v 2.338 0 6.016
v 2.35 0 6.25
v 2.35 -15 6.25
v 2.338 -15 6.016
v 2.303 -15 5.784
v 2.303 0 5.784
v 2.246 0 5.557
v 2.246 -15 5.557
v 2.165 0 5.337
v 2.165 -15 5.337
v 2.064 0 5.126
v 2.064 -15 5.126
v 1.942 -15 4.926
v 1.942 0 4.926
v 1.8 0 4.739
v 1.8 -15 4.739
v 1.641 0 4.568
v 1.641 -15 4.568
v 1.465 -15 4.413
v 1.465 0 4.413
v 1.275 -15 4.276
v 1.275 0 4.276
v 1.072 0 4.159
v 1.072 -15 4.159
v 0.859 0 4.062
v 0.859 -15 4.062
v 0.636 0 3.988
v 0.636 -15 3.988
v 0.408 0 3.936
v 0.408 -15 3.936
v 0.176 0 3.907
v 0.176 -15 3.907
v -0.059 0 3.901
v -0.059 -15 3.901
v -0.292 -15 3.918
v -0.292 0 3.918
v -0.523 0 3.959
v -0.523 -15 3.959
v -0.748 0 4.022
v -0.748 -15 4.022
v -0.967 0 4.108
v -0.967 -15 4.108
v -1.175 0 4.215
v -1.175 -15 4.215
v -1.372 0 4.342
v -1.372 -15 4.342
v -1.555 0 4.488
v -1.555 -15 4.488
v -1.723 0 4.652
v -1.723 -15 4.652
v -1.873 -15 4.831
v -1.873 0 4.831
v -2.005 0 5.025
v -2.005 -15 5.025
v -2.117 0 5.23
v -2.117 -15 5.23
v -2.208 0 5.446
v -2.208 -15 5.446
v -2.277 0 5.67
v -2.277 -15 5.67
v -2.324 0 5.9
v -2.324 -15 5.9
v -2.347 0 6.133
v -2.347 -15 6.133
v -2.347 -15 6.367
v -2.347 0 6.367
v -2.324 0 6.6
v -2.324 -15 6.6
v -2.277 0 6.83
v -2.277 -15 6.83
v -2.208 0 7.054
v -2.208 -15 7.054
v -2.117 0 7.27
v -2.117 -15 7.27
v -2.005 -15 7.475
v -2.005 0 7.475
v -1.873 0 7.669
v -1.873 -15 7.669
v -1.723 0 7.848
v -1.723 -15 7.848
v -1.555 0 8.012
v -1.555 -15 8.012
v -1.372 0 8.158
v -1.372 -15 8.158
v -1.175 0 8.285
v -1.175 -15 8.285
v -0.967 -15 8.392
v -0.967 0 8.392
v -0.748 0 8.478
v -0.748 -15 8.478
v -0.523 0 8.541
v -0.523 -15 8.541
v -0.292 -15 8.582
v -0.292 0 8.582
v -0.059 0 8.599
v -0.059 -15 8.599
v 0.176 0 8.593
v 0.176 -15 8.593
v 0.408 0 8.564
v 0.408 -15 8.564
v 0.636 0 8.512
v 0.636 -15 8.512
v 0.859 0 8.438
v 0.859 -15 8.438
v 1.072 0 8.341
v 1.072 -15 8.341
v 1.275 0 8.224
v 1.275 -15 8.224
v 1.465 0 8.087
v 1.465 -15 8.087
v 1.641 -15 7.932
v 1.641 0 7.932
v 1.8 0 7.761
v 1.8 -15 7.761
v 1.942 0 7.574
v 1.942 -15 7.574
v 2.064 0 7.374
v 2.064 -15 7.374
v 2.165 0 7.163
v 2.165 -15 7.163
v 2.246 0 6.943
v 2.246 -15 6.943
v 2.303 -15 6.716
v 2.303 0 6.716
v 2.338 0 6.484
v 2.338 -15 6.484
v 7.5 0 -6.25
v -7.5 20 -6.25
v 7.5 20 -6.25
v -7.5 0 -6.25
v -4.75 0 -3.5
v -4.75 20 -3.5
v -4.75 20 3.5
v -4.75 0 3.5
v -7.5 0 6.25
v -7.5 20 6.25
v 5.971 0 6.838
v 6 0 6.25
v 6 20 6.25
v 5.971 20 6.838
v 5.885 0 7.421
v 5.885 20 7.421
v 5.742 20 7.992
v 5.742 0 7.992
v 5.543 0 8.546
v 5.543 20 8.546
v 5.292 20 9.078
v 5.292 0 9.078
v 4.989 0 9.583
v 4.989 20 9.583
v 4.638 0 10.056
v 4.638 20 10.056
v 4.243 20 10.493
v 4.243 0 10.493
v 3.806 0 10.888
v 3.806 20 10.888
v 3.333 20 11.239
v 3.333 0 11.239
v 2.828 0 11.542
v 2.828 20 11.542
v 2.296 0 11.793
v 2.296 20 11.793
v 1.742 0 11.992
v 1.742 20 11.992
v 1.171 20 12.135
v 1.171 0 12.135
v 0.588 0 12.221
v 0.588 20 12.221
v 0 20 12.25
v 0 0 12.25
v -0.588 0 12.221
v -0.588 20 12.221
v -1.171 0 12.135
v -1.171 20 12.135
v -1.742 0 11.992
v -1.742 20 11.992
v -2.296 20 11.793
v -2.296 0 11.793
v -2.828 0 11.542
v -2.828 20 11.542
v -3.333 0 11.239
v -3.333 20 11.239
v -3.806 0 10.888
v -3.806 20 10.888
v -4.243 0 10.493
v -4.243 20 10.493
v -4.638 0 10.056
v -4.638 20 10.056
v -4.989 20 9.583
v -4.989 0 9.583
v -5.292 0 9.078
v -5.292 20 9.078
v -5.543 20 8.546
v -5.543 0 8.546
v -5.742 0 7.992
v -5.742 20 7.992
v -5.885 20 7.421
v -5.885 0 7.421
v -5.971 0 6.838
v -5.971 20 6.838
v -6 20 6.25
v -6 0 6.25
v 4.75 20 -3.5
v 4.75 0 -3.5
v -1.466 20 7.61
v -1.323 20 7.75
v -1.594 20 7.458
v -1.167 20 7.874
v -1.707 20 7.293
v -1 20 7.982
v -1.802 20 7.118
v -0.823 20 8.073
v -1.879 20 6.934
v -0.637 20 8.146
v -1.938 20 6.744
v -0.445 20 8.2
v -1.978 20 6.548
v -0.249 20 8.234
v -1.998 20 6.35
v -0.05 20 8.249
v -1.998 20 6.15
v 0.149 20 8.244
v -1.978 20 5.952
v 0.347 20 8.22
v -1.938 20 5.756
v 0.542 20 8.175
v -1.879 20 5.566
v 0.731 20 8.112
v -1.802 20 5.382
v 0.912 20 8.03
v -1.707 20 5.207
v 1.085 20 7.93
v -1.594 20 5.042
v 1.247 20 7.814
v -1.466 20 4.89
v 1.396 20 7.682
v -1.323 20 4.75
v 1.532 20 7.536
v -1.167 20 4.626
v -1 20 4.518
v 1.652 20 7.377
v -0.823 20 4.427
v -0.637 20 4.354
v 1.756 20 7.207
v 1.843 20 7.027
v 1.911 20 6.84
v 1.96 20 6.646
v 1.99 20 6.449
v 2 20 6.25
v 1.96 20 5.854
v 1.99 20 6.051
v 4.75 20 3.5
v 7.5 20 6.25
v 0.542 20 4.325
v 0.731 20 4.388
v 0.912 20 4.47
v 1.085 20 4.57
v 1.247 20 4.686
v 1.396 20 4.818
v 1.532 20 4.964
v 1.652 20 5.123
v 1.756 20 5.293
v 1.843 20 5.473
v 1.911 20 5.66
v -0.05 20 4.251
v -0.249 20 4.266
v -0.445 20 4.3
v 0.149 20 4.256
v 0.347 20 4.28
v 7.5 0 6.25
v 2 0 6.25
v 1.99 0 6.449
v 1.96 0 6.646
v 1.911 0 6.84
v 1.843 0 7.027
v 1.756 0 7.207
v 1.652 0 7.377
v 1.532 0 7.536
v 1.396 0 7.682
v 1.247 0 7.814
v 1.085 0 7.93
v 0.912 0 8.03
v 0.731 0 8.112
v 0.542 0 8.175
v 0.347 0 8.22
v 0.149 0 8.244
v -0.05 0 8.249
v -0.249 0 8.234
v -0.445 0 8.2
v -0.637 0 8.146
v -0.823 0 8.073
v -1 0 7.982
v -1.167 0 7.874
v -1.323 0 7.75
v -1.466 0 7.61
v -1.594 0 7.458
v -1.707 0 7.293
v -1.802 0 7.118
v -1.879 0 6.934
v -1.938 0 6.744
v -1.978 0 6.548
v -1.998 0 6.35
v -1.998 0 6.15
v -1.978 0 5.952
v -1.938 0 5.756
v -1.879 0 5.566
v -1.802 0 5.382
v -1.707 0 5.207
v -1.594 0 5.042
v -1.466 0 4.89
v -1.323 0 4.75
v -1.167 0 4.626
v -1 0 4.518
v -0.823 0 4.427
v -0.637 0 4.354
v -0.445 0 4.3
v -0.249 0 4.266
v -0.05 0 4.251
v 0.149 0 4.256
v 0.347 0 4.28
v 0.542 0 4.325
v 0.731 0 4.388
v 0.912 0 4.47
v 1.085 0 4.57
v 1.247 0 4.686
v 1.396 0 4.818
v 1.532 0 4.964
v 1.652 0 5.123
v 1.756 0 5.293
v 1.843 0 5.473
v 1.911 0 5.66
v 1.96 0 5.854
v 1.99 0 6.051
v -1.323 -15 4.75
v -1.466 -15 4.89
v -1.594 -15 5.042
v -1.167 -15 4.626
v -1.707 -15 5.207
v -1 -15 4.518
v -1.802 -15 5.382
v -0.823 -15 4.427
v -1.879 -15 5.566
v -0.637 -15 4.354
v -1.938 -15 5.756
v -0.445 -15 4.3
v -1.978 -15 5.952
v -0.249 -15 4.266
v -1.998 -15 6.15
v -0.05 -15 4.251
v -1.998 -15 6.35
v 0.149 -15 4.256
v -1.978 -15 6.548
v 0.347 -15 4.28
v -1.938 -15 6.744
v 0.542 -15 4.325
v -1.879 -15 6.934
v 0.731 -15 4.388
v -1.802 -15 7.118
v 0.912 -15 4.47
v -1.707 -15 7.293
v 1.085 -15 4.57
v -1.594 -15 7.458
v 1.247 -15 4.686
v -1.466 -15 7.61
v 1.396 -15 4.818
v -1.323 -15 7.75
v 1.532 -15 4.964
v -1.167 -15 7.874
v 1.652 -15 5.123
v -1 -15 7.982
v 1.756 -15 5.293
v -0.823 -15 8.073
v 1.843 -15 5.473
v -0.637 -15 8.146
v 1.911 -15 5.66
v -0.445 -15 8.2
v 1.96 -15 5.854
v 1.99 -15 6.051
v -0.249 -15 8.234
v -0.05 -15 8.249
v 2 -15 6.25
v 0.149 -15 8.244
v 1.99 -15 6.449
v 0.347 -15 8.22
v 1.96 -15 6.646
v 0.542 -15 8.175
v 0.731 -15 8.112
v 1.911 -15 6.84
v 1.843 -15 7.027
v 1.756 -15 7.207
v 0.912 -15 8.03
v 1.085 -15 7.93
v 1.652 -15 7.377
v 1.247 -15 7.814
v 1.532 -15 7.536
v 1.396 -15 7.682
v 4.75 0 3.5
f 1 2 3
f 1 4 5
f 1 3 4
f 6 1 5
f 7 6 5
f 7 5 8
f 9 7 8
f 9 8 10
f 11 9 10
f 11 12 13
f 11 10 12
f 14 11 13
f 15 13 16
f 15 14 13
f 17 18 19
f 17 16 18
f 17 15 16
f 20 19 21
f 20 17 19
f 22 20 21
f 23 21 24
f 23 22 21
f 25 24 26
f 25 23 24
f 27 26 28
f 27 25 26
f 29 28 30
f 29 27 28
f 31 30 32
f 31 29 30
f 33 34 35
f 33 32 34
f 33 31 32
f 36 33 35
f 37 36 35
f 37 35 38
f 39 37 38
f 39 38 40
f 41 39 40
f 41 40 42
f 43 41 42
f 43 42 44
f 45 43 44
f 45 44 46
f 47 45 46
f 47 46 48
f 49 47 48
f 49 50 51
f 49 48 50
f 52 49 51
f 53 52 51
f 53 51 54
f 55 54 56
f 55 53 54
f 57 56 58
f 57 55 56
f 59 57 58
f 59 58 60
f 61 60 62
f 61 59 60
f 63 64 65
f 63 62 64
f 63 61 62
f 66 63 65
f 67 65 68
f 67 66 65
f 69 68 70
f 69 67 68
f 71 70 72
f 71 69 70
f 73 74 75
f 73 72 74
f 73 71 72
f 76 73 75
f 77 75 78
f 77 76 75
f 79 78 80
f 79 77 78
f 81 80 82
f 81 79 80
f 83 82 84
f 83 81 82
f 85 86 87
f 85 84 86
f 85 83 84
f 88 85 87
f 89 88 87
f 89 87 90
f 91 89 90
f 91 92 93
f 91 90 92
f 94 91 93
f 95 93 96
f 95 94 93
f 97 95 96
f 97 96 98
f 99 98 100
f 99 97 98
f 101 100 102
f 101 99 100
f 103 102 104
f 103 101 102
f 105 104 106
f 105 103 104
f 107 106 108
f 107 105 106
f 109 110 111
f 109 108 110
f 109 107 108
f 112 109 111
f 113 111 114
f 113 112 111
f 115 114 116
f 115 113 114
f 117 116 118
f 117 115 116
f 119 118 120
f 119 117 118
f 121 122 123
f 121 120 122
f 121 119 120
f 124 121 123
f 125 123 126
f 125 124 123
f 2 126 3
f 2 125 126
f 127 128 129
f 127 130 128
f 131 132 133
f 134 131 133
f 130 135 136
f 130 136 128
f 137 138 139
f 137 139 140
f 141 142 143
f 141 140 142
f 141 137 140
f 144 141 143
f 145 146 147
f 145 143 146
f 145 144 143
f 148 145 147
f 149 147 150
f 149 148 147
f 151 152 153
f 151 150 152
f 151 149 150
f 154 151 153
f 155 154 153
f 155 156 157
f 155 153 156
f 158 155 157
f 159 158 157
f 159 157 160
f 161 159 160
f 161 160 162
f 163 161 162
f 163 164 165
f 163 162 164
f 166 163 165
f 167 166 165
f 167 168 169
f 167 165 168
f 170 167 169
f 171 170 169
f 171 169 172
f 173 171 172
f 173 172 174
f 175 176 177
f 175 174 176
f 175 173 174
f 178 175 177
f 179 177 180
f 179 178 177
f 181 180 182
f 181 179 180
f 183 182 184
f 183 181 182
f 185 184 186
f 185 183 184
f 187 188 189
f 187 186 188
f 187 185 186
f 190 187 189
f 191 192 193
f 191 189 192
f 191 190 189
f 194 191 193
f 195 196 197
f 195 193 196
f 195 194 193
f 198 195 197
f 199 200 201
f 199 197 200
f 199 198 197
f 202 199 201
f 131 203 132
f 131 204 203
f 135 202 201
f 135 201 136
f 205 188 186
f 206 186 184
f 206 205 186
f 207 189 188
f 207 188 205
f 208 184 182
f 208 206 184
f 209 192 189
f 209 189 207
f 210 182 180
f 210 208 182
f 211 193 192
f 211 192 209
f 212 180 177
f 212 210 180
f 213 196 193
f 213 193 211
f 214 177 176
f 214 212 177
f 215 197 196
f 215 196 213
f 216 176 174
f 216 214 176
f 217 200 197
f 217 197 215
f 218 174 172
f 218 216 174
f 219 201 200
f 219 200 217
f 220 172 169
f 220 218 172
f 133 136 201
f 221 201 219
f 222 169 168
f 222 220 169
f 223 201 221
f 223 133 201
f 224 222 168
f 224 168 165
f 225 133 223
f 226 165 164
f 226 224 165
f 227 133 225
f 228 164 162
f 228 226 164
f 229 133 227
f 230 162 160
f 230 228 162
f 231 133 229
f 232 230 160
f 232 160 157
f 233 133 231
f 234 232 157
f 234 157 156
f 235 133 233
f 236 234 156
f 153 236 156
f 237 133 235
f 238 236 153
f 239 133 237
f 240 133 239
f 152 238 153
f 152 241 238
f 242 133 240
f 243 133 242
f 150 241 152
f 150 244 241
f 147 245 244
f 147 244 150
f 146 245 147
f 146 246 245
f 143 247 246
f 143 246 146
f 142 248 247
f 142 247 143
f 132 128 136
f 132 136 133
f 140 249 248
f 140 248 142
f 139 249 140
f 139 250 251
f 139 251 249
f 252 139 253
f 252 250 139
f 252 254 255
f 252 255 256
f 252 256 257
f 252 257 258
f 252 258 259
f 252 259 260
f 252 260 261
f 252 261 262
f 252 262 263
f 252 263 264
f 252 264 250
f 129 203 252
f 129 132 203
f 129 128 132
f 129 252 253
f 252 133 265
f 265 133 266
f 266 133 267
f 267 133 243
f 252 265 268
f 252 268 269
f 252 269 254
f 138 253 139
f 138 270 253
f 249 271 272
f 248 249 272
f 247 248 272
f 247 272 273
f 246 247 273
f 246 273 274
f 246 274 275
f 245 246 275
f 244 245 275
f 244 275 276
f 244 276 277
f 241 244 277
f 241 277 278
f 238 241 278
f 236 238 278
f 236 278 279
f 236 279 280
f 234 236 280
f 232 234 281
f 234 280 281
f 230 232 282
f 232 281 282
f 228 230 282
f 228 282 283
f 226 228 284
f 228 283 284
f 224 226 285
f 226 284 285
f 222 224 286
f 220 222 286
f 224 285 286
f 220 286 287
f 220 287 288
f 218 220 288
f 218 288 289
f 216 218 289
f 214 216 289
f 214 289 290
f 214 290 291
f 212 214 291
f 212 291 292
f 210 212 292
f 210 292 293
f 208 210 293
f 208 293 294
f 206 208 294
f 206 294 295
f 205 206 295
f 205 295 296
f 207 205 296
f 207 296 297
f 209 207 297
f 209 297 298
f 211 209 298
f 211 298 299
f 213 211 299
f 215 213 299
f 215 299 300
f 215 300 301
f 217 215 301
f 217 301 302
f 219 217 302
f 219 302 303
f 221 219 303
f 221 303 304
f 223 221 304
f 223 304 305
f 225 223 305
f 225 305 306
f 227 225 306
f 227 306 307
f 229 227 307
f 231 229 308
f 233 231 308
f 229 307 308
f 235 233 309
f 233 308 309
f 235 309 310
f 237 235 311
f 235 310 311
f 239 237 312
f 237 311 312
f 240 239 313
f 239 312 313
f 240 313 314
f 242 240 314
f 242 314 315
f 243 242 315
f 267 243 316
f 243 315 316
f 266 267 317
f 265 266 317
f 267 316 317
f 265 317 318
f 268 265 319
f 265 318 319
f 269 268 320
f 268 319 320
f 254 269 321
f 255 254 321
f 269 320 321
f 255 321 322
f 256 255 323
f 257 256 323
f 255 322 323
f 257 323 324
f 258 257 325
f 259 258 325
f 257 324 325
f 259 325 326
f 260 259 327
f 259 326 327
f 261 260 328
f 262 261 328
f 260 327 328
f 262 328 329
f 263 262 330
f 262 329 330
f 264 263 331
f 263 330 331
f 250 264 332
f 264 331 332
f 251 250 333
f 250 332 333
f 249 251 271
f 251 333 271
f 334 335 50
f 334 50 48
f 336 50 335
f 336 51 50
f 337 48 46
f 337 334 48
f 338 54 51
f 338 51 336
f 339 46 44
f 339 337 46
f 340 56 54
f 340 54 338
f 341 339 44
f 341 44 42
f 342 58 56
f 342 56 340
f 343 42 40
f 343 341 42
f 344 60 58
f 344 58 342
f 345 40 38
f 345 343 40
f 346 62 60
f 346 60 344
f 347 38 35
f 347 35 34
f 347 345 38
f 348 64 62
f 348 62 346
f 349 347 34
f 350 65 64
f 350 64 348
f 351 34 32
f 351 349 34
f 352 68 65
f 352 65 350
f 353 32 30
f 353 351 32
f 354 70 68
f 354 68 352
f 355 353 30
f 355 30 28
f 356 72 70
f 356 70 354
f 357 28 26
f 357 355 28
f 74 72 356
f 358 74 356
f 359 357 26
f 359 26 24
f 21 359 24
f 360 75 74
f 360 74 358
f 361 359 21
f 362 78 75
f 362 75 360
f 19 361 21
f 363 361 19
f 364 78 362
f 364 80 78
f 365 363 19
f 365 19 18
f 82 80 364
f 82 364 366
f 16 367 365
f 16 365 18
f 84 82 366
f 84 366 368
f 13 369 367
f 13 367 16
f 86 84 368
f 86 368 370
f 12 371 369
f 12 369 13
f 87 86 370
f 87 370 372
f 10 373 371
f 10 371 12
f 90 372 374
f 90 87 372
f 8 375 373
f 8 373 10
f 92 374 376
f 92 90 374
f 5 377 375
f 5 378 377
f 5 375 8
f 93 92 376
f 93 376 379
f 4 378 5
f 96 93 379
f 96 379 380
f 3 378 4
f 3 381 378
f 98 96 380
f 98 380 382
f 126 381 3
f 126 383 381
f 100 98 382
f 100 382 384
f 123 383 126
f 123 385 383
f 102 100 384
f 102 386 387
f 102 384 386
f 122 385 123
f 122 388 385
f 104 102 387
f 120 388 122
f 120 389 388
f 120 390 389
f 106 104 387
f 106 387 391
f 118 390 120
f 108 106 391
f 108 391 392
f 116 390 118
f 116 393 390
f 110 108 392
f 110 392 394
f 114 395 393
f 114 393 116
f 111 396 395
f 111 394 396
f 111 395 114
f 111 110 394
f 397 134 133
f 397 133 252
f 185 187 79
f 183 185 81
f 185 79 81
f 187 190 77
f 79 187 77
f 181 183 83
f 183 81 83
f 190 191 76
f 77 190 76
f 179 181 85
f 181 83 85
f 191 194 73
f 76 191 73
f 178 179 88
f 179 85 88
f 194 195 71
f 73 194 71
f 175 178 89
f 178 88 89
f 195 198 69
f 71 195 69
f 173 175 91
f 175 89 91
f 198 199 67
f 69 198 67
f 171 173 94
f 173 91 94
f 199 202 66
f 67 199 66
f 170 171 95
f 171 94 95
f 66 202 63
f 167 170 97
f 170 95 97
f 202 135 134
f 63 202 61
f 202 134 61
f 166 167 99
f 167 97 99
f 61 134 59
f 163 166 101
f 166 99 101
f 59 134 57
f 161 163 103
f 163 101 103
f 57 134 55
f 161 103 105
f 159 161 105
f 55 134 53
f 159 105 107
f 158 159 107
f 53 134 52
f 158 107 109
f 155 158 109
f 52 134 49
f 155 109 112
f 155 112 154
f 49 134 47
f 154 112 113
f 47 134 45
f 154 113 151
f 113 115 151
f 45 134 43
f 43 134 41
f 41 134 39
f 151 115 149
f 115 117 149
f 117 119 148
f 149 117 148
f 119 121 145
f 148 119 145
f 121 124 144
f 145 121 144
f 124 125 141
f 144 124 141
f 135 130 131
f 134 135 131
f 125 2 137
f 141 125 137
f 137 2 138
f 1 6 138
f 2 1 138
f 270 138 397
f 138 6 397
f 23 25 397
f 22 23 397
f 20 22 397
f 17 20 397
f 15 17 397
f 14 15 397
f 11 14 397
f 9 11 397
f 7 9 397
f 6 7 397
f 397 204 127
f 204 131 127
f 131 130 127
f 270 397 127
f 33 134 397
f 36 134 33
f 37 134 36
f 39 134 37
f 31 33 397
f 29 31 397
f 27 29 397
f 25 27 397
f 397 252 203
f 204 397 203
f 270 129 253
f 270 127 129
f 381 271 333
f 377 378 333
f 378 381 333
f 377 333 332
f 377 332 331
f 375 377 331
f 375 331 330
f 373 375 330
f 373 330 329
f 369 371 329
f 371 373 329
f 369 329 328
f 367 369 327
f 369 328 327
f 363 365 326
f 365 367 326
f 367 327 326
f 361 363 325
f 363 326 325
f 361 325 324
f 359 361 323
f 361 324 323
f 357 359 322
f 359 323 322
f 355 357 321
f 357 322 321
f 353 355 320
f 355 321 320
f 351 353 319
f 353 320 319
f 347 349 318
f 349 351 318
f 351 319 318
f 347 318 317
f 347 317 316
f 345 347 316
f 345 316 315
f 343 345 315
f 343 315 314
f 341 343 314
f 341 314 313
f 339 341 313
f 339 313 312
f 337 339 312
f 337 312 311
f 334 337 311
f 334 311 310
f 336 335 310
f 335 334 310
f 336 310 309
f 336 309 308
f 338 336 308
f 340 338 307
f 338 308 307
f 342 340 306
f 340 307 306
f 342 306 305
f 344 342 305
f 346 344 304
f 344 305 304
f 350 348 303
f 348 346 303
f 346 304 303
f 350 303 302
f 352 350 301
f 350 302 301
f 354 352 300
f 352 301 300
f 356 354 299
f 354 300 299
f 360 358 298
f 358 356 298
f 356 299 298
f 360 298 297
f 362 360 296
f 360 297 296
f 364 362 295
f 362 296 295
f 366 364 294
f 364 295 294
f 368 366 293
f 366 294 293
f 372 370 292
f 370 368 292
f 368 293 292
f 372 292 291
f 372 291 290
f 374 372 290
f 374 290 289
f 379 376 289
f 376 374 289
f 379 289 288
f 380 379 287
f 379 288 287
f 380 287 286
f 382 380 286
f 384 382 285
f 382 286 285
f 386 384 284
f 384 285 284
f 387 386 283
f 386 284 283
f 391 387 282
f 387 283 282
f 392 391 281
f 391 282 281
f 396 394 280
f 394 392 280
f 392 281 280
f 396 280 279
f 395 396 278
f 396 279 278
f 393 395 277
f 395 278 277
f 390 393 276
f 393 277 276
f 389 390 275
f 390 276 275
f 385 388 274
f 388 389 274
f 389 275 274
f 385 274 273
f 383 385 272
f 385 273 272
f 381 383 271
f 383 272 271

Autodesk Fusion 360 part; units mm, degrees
sketch "Sketch1" plane through (0, 0, 0) normal (0, 1, 0) x (1, 0, 0)
  line L0 (-7.5, 6.25) -> (7.5, 6.25)
  line L1 (7.5, 6.25) -> (7.5, -6.25)
  line L2 (-7.5, -6.25) -> (-7.5, 6.25)
  line L3 (-7.5, 6.25) -> (7.5, -6.25) construction
  line L4 (7.5, 6.25) -> (-7.5, -6.25) construction
  line L5 (7.5, -6.25) -> (6, -6.25)
  line L6 (-6, -6.25) -> (-7.5, -6.25)
  arc A0 (-6, -6.25) -> (6, -6.25) centre (0, -6.25) ccw
  arc A1 (0.3096, -0.258) -> (-0.3096, -0.258) centre (0, -6.25) ccw
  dimension "d1" = 15
  dimension "d2" = 12.5
  dimension "d3" = 12
extrude "Extrude1" add sketch "Sketch1" along normal blind 20
sketch "Sketch2" plane through (0, 0, 0) normal (0, -1, 0) x (1, 0, 0)
  line L0 (-6, 6.25) -> (-7.5, 6.25)
  line L1 (-7.5, 6.25) -> (-7.5, -6.25)
  line L2 (-7.5, -6.25) -> (7.5, -6.25)
  line L3 (7.5, -6.25) -> (7.5, 6.25)
  line L4 (7.5, 6.25) -> (6, 6.25)
  arc A0 (6, 6.25) -> (-6, 6.25) centre (0, 6.25) ccw
  line L5 (4.75, -3.5) -> (-4.75, -3.5)
  line L6 (-4.75, -3.5) -> (-4.75, 3.5)
  line L7 (-4.75, 3.5) -> (4.75, 3.5)
  line L8 (4.75, 3.5) -> (4.75, -3.5)
  line L9 (4.75, -3.5) -> (-4.75, 3.5) construction
  line L10 (-4.75, -3.5) -> (4.75, 3.5) construction
  dimension "d6" = 9.5
  dimension "d7" = 7
extrude "Extrude2" cut sketch "Sketch2" against normal blind 39 contours L5 L6 L7 L8
sketch "Sketch3" plane through (0, 0, 0) normal (0, -1, 0) x (1, 0, 0)
  line L0 (-4.75, -3.5) -> (-4.75, 3.5)
  line L1 (-4.75, 3.5) -> (4.75, 3.5)
  line L2 (4.75, 3.5) -> (4.75, -3.5)
  line L3 (4.75, -3.5) -> (-4.75, -3.5)
  line L4 (-6, 6.25) -> (-7.5, 6.25)
  line L5 (-7.5, 6.25) -> (-7.5, -6.25)
  line L6 (-7.5, -6.25) -> (7.5, -6.25)
  line L7 (7.5, -6.25) -> (7.5, 6.25)
  line L8 (7.5, 6.25) -> (6, 6.25)
  arc A0 (6, 6.25) -> (-6, 6.25) centre (0, 6.25) ccw
  circle A1 centre (0, 6.25) radius 2
  dimension "d10" = 4
extrude "Extrude3" cut sketch "Sketch3" against normal blind 30 contours A1
sketch "Sketch4" plane through (0, 0, 0) normal (0, -1, 0) x (1, 0, 0)
  circle A0 centre (0, 6.25) radius 2
  line L0 (-4.75, -3.5) -> (-4.75, 3.5)
  line L1 (-4.75, 3.5) -> (4.75, 3.5)
  line L2 (4.75, 3.5) -> (4.75, -3.5)
  line L3 (4.75, -3.5) -> (-4.75, -3.5)
  line L4 (-6, 6.25) -> (-7.5, 6.25)
  line L5 (-7.5, 6.25) -> (-7.5, -6.25)
  line L6 (-7.5, -6.25) -> (7.5, -6.25)
  line L7 (7.5, -6.25) -> (7.5, 6.25)
  line L8 (7.5, 6.25) -> (6, 6.25)
  arc A1 (6, 6.25) -> (-6, 6.25) centre (0, 6.25) ccw
  circle A2 centre (0, 6.25) radius 2.35
  dimension "d13" = 0.35
extrude "Extrude4" add sketch "Sketch4" along normal blind 15 contours A2
